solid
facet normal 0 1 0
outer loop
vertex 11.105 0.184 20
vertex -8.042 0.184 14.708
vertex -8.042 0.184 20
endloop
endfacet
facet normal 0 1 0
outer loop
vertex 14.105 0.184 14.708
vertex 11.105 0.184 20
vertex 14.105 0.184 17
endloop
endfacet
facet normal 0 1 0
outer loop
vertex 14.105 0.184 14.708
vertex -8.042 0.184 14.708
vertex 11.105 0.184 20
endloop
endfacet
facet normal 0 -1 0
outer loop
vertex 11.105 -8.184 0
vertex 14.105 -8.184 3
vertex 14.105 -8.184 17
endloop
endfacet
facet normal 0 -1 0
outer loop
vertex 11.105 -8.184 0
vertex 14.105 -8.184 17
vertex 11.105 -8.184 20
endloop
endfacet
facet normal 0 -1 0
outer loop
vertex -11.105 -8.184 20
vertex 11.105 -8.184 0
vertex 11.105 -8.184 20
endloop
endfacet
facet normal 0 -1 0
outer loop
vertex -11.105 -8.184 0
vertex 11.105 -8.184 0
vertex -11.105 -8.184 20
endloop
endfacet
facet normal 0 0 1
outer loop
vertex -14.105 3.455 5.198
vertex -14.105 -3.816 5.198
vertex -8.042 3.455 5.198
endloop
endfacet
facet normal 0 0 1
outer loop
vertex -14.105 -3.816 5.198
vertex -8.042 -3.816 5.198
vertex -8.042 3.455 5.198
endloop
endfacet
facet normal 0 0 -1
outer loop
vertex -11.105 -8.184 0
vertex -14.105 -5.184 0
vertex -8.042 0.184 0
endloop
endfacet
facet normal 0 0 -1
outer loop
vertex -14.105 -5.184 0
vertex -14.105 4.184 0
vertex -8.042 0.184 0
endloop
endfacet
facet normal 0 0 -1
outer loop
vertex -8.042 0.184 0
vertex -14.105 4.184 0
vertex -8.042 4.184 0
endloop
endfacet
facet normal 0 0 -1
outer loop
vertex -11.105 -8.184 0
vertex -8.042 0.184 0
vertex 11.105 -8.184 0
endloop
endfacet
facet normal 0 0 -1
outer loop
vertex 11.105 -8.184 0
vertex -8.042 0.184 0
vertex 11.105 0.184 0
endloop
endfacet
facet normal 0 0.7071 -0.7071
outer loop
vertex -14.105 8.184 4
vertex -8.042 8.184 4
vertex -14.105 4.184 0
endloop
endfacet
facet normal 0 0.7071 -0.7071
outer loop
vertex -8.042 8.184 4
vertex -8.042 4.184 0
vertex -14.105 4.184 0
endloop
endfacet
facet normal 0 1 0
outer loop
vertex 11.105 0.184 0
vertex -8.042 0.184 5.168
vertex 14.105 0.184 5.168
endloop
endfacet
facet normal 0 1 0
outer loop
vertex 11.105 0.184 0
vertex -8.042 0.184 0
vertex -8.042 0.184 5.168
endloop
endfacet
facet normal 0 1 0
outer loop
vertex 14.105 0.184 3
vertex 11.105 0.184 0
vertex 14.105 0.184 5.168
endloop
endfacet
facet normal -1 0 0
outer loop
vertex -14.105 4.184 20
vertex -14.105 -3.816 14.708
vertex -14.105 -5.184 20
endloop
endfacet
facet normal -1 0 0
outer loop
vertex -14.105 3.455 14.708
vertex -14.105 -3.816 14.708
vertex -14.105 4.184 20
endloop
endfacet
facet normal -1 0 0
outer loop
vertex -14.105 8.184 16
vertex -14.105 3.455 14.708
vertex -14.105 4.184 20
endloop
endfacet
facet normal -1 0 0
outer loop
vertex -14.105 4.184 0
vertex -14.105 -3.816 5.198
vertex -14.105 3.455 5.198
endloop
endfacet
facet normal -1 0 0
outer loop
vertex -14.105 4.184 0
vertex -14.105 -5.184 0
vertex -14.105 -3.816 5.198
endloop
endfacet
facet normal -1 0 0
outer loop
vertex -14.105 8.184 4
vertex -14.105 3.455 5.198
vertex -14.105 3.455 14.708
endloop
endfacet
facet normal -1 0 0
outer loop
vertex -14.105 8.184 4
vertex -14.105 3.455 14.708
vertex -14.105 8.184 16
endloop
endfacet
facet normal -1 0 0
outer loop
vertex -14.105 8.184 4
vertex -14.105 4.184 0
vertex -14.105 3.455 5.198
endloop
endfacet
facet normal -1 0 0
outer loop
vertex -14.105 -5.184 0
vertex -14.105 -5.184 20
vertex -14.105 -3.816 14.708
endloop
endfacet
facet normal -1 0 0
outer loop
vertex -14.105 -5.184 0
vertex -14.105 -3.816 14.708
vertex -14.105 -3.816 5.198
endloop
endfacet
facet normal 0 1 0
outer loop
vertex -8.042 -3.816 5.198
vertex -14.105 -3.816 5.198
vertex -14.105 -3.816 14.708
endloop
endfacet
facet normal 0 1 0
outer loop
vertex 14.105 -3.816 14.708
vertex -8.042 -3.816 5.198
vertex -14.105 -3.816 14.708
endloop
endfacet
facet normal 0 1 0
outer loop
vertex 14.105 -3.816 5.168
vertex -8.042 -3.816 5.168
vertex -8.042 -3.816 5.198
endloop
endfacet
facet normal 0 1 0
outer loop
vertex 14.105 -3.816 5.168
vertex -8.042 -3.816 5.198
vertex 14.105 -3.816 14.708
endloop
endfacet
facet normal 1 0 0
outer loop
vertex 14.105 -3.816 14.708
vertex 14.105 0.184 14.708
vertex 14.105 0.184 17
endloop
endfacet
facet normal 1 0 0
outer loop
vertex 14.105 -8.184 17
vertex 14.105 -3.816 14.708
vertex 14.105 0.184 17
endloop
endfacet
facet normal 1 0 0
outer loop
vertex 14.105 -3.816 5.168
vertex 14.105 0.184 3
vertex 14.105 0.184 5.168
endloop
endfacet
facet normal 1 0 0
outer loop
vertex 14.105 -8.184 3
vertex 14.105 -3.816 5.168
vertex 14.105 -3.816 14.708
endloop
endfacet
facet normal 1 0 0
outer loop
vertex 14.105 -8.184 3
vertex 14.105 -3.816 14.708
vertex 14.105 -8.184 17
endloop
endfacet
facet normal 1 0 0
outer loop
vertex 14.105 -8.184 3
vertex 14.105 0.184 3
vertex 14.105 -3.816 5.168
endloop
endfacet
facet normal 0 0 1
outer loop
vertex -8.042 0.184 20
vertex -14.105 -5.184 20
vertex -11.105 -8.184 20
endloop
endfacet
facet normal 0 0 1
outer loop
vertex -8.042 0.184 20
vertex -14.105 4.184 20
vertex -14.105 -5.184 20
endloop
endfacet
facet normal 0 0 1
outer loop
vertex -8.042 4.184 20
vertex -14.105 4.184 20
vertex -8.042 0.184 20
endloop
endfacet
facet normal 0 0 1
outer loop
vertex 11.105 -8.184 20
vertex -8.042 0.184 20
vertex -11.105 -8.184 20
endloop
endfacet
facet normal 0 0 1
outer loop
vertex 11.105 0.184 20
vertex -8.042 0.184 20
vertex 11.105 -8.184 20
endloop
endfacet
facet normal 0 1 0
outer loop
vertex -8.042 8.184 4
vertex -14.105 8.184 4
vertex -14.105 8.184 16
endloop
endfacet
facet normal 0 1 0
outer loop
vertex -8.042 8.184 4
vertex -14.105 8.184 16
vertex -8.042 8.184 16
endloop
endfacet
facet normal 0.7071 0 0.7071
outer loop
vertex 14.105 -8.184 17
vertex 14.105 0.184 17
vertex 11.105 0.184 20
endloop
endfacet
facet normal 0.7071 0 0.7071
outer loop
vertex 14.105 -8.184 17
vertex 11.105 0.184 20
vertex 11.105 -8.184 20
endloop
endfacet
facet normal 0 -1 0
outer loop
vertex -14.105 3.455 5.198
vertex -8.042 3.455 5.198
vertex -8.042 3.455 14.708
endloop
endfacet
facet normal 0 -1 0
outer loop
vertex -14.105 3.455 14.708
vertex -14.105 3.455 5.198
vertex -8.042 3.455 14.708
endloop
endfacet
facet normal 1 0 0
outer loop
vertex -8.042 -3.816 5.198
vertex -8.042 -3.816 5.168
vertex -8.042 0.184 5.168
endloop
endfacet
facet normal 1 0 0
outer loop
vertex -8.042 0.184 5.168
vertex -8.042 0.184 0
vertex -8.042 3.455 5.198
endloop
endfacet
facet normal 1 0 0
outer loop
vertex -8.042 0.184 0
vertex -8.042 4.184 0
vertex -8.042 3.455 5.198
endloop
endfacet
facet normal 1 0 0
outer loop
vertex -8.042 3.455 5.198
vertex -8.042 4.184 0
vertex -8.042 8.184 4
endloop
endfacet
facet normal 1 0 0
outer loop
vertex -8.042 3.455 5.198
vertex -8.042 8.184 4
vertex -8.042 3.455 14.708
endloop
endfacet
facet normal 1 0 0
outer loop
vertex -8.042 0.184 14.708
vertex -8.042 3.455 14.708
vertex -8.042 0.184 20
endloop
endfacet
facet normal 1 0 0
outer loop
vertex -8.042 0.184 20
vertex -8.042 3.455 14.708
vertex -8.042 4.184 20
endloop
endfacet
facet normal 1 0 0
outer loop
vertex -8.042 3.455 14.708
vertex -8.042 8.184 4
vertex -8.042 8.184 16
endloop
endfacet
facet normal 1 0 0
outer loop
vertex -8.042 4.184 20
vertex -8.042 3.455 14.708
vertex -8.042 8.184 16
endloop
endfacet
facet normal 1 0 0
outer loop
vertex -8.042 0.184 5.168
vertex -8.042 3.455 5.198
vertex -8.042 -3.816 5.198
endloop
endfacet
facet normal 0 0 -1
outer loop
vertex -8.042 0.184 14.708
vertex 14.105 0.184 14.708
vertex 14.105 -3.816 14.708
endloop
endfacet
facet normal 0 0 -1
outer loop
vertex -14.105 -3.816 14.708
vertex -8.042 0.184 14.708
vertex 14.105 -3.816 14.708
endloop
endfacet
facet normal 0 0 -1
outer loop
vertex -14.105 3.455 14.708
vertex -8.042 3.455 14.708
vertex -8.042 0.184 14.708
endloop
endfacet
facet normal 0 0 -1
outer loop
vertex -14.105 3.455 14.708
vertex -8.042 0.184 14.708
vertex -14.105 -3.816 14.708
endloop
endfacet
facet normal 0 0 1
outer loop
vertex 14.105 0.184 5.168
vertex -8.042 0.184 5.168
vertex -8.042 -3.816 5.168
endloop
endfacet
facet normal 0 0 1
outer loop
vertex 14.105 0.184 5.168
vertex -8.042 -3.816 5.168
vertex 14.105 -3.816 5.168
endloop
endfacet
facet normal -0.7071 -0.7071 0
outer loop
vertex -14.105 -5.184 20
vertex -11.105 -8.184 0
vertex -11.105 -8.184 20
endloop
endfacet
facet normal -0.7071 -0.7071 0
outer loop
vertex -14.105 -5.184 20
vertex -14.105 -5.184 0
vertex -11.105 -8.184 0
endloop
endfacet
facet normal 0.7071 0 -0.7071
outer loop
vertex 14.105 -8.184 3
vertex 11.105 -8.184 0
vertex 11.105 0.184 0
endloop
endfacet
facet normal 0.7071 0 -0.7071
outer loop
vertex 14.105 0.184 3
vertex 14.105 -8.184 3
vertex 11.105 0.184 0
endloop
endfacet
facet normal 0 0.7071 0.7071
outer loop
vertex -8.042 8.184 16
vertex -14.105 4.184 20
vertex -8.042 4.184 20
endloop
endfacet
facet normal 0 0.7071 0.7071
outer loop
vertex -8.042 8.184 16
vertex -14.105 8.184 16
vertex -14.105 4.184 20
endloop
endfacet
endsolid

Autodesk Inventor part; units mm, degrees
ref_plane "YZ Plane" through (0, 0, 0) normal (1, 0, 0) x (0, 1, 0)
ref_plane "XZ Plane" through (0, 0, 0) normal (0, 1, 0) x (-1, 0, 0)
ref_plane "XY Plane" through (0, 0, 0) normal (0, 0, 1) x (1, 0, 0)
sketch "스케치1" plane through (0, 0, 0) normal (0, 0, 1) x (1, 0, 0)
  line L0 (14.1048, -8.184) -> (-14.1048, -8.184)
  line L1 (-14.1048, -8.184) -> (-14.1048, 8.184)
  line L2 (-14.1048, 8.184) -> (14.1048, 8.184)
  line L3 (14.1048, 8.184) -> (14.1048, -8.184)
  line L4 (14.1048, -8.184) -> (-14.1048, 8.184) construction
  line L5 (-14.1048, -8.184) -> (14.1048, 8.184) construction
  point P0 (0, 0)
extrude "돌출1" add sketch "스케치1" along normal blind 20
sketch "스케치2" plane through (-14.1048, 8.184, 0) normal (0, 1, 0) x (1, 0, 0)
  line L0 (0, -20) -> (28.2096, -20) projected
  line L1 (28.2096, 0) -> (0, 0) projected
  line L2 (6.0629, -20) -> (28.2096, -20)
  line L3 (28.2096, -20) -> (28.2096, 0)
  line L4 (28.2096, 0) -> (6.0629, 0)
  line L5 (6.0629, 0) -> (6.0629, -20)
  point P0 (14.1048, 0)
extrude "돌출2" cut sketch "스케치2" against normal blind 8
sketch "스케치3" plane through (-14.1048, 0.184, 0) normal (0, 1, 0) x (1, 0, 0)
  line L0 (6.0629, -20) -> (6.0629, 0) projected
  line L1 (28.2096, 0) -> (28.2096, -20) projected
  line L2 (6.0629, -5.1676) -> (28.2096, -5.1676)
  line L3 (28.2096, -5.1676) -> (28.2096, -14.7078)
  line L4 (28.2096, -14.7078) -> (6.0629, -14.7078)
  line L5 (6.0629, -14.7078) -> (6.0629, -5.1676)
  point P0 (14.1048, 0)
extrude "돌출3" cut sketch "스케치3" against normal blind 4
sketch "스케치4" plane through (-8.0419, 8.184, 20) normal (1, 0, 0) x (0, 0, -1)
  point P0 (20, -8.184)
sketch "스케치5" plane through (-8.0419, 8.184, 20) normal (1, 0, 0) x (0, 0, -1)
  line L0 (5.2922, -8) -> (5.2922, -12) projected
  line L1 (5.2922, -12) -> (14.8018, -12)
  line L2 (14.8018, -12) -> (14.8018, -4.7287)
  line L3 (14.8018, -4.7287) -> (5.2922, -4.7287)
  line L4 (5.2922, -4.7287) -> (5.2922, -12)
  point P0 (20, -8.184)
extrude "돌출4" cut sketch "스케치5" against normal blind 10
chamfer "모따기1" distance 4 angle 45 1 edges at (-11.0733, 8.184, 20)
chamfer "모따기2" distance 4 angle 45 1 edges at (-11.0733, 8.184, 0)
chamfer "모따기3" distance 3 angle 45 1 edges at (14.1048, -4, 20)
chamfer "모따기4" distance 3 angle 45 1 edges at (14.1048, -4, 0)
chamfer "모따기5" distance 3 angle 45 1 edges at (-14.1048, -8.184, 10)
properties part number "240503_3Dsketch10"
